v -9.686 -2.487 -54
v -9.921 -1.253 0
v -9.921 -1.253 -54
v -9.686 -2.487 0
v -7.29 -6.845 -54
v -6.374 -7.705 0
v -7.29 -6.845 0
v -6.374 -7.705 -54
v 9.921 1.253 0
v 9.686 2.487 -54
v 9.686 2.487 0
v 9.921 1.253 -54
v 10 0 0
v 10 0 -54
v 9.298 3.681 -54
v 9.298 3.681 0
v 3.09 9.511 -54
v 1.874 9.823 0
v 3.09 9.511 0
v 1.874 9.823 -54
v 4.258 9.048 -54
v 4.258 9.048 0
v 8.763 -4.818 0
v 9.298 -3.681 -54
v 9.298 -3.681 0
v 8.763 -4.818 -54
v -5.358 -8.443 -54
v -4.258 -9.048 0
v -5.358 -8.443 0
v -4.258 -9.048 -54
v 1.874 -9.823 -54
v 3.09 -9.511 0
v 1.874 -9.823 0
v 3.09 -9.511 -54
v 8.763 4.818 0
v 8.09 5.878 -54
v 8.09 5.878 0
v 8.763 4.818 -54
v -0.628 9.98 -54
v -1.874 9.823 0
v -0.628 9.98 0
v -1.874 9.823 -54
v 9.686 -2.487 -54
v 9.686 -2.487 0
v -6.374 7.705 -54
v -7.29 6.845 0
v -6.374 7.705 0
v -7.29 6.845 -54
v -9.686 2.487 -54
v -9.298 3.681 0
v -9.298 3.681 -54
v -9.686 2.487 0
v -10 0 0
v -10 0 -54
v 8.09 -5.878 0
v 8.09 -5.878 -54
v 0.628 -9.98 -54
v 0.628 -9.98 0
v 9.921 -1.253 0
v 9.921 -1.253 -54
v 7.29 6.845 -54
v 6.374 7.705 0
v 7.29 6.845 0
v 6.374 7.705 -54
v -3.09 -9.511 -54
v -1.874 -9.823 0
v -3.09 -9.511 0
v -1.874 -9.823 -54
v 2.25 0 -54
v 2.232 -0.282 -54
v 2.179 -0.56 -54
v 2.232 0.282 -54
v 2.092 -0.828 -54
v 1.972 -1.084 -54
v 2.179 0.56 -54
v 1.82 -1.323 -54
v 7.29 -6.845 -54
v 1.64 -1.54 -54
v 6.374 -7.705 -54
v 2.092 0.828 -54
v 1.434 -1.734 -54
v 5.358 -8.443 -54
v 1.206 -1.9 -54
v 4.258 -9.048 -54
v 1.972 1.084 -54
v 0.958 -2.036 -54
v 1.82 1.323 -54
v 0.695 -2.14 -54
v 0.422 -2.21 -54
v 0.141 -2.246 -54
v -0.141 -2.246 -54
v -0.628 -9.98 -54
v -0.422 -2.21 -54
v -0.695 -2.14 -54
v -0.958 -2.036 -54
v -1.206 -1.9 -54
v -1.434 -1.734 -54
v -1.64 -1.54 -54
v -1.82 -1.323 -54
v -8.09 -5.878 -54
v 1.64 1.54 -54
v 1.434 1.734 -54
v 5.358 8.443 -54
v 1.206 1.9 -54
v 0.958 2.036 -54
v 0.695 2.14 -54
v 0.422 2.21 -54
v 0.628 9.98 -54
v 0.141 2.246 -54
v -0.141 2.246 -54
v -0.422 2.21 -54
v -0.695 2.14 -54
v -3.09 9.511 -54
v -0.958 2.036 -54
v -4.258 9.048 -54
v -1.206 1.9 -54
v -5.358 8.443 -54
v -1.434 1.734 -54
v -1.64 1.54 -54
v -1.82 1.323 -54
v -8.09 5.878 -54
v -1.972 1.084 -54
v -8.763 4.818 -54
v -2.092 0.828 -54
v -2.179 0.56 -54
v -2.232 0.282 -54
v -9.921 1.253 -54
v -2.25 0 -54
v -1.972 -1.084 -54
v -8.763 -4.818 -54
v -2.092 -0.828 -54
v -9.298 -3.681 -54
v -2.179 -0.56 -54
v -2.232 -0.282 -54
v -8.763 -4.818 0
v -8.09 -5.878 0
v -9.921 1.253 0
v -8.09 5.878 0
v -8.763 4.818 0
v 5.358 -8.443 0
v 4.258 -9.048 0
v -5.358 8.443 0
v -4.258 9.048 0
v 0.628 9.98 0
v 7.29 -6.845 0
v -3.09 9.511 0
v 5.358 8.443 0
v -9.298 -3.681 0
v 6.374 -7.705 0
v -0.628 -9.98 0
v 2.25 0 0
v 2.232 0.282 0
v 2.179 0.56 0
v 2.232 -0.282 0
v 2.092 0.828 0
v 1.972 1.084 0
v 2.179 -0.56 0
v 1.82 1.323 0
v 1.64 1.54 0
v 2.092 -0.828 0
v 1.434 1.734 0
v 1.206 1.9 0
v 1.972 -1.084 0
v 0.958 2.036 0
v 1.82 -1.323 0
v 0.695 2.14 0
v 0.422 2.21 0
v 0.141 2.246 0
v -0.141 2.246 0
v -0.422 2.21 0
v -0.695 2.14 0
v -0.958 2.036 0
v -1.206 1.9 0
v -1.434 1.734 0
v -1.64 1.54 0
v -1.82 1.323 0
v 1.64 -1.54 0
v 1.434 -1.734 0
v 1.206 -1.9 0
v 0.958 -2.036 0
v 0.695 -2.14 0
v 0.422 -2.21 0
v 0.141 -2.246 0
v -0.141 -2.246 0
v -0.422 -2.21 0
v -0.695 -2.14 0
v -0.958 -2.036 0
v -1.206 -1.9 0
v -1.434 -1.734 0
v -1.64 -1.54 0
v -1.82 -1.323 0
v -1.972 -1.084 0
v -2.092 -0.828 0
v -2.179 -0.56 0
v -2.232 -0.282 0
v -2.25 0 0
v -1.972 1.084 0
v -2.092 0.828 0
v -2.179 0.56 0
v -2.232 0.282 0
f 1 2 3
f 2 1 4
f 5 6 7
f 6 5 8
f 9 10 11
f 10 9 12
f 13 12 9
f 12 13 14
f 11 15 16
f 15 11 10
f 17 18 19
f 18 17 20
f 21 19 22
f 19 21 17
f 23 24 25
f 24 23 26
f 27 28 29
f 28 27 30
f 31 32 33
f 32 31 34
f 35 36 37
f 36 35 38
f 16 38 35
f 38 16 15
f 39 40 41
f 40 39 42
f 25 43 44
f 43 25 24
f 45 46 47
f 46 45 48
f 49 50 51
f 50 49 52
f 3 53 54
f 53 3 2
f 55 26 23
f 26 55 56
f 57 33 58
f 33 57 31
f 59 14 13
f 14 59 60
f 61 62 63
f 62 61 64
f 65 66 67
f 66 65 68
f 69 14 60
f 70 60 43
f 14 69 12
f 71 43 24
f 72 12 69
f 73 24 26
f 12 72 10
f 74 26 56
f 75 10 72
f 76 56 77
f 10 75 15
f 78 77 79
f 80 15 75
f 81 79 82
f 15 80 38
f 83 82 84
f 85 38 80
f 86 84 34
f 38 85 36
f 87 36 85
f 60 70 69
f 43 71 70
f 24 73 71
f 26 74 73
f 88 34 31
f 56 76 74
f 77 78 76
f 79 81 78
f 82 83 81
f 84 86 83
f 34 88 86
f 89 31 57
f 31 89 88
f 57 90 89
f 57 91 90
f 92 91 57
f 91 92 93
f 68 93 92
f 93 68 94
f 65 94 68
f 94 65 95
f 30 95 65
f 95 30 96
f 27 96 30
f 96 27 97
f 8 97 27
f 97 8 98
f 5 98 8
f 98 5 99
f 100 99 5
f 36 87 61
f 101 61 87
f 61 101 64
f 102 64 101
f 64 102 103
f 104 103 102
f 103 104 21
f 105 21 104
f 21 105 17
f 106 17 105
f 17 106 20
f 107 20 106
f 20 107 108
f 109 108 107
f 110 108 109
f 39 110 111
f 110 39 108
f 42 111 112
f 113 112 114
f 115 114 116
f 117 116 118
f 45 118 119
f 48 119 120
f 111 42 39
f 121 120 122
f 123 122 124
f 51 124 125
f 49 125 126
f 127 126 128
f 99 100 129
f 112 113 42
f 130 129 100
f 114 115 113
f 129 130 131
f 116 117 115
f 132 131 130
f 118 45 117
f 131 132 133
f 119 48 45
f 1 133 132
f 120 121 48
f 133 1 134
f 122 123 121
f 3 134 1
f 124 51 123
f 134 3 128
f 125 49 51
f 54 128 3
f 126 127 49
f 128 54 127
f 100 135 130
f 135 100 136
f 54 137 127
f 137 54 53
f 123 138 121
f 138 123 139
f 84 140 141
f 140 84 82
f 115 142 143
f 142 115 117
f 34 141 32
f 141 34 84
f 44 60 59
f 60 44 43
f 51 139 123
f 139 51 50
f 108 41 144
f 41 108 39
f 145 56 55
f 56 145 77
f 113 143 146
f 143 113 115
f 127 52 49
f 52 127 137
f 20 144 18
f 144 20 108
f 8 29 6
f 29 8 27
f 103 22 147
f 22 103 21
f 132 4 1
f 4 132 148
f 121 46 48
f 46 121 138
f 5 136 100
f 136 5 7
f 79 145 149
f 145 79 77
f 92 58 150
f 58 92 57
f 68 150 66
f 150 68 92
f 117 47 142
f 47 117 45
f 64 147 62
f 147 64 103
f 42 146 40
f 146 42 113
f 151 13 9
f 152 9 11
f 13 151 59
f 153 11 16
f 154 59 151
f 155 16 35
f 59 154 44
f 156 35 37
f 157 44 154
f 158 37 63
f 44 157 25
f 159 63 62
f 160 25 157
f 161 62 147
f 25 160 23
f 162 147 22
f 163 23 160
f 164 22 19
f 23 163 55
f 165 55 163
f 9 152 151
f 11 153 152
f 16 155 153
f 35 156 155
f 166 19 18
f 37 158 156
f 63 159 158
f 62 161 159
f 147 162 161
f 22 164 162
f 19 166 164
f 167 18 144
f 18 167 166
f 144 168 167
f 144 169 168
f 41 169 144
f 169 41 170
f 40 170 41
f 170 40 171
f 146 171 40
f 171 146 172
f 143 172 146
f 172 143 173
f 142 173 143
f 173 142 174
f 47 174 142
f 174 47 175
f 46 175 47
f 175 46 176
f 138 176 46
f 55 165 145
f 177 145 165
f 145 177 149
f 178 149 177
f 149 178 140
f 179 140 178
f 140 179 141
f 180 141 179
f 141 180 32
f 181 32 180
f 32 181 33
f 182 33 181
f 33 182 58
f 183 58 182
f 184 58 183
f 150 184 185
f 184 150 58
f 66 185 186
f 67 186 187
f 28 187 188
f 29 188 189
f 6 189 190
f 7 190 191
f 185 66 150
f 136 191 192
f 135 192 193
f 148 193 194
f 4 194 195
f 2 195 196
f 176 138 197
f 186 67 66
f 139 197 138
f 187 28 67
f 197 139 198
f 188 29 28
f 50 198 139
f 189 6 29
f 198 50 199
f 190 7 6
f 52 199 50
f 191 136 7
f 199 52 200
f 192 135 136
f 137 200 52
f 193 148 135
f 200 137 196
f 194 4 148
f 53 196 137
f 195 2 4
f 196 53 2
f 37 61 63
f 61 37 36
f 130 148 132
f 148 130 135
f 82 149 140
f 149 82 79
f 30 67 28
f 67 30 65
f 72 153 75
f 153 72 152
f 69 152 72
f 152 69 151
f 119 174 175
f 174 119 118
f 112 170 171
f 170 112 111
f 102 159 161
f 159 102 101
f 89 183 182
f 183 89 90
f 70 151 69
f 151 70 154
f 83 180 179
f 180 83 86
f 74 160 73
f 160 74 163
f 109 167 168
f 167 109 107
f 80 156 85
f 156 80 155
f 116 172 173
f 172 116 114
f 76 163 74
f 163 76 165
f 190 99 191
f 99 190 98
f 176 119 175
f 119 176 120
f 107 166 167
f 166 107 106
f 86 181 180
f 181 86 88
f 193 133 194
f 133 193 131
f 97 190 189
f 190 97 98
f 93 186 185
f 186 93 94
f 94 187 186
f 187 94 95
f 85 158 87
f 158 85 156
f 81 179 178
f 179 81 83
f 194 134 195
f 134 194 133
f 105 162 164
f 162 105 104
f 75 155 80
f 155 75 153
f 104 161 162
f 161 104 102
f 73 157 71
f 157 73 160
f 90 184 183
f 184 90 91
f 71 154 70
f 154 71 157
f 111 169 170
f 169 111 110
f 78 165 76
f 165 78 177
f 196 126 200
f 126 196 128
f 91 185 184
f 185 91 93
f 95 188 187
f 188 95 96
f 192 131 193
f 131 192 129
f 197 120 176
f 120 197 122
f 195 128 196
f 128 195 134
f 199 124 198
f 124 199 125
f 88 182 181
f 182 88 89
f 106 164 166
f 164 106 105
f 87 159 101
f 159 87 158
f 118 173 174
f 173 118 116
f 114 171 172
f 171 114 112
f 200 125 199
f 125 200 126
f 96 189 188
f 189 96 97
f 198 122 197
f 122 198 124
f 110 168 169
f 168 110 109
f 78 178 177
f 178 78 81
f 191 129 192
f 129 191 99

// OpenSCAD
$fn = 50;


difference() {
	union() {
		translate(v = [0, 0, -54.0000000000]) {
			cylinder(h = 54, r = 10.0000000000);
		}
		cylinder(h = 0, r = 16.0000000000);
	}
	union() {
		#translate(v = [0, 0, -54]) {
			cylinder(h = 54, r = 2.2500000000);
		}
	}
}
